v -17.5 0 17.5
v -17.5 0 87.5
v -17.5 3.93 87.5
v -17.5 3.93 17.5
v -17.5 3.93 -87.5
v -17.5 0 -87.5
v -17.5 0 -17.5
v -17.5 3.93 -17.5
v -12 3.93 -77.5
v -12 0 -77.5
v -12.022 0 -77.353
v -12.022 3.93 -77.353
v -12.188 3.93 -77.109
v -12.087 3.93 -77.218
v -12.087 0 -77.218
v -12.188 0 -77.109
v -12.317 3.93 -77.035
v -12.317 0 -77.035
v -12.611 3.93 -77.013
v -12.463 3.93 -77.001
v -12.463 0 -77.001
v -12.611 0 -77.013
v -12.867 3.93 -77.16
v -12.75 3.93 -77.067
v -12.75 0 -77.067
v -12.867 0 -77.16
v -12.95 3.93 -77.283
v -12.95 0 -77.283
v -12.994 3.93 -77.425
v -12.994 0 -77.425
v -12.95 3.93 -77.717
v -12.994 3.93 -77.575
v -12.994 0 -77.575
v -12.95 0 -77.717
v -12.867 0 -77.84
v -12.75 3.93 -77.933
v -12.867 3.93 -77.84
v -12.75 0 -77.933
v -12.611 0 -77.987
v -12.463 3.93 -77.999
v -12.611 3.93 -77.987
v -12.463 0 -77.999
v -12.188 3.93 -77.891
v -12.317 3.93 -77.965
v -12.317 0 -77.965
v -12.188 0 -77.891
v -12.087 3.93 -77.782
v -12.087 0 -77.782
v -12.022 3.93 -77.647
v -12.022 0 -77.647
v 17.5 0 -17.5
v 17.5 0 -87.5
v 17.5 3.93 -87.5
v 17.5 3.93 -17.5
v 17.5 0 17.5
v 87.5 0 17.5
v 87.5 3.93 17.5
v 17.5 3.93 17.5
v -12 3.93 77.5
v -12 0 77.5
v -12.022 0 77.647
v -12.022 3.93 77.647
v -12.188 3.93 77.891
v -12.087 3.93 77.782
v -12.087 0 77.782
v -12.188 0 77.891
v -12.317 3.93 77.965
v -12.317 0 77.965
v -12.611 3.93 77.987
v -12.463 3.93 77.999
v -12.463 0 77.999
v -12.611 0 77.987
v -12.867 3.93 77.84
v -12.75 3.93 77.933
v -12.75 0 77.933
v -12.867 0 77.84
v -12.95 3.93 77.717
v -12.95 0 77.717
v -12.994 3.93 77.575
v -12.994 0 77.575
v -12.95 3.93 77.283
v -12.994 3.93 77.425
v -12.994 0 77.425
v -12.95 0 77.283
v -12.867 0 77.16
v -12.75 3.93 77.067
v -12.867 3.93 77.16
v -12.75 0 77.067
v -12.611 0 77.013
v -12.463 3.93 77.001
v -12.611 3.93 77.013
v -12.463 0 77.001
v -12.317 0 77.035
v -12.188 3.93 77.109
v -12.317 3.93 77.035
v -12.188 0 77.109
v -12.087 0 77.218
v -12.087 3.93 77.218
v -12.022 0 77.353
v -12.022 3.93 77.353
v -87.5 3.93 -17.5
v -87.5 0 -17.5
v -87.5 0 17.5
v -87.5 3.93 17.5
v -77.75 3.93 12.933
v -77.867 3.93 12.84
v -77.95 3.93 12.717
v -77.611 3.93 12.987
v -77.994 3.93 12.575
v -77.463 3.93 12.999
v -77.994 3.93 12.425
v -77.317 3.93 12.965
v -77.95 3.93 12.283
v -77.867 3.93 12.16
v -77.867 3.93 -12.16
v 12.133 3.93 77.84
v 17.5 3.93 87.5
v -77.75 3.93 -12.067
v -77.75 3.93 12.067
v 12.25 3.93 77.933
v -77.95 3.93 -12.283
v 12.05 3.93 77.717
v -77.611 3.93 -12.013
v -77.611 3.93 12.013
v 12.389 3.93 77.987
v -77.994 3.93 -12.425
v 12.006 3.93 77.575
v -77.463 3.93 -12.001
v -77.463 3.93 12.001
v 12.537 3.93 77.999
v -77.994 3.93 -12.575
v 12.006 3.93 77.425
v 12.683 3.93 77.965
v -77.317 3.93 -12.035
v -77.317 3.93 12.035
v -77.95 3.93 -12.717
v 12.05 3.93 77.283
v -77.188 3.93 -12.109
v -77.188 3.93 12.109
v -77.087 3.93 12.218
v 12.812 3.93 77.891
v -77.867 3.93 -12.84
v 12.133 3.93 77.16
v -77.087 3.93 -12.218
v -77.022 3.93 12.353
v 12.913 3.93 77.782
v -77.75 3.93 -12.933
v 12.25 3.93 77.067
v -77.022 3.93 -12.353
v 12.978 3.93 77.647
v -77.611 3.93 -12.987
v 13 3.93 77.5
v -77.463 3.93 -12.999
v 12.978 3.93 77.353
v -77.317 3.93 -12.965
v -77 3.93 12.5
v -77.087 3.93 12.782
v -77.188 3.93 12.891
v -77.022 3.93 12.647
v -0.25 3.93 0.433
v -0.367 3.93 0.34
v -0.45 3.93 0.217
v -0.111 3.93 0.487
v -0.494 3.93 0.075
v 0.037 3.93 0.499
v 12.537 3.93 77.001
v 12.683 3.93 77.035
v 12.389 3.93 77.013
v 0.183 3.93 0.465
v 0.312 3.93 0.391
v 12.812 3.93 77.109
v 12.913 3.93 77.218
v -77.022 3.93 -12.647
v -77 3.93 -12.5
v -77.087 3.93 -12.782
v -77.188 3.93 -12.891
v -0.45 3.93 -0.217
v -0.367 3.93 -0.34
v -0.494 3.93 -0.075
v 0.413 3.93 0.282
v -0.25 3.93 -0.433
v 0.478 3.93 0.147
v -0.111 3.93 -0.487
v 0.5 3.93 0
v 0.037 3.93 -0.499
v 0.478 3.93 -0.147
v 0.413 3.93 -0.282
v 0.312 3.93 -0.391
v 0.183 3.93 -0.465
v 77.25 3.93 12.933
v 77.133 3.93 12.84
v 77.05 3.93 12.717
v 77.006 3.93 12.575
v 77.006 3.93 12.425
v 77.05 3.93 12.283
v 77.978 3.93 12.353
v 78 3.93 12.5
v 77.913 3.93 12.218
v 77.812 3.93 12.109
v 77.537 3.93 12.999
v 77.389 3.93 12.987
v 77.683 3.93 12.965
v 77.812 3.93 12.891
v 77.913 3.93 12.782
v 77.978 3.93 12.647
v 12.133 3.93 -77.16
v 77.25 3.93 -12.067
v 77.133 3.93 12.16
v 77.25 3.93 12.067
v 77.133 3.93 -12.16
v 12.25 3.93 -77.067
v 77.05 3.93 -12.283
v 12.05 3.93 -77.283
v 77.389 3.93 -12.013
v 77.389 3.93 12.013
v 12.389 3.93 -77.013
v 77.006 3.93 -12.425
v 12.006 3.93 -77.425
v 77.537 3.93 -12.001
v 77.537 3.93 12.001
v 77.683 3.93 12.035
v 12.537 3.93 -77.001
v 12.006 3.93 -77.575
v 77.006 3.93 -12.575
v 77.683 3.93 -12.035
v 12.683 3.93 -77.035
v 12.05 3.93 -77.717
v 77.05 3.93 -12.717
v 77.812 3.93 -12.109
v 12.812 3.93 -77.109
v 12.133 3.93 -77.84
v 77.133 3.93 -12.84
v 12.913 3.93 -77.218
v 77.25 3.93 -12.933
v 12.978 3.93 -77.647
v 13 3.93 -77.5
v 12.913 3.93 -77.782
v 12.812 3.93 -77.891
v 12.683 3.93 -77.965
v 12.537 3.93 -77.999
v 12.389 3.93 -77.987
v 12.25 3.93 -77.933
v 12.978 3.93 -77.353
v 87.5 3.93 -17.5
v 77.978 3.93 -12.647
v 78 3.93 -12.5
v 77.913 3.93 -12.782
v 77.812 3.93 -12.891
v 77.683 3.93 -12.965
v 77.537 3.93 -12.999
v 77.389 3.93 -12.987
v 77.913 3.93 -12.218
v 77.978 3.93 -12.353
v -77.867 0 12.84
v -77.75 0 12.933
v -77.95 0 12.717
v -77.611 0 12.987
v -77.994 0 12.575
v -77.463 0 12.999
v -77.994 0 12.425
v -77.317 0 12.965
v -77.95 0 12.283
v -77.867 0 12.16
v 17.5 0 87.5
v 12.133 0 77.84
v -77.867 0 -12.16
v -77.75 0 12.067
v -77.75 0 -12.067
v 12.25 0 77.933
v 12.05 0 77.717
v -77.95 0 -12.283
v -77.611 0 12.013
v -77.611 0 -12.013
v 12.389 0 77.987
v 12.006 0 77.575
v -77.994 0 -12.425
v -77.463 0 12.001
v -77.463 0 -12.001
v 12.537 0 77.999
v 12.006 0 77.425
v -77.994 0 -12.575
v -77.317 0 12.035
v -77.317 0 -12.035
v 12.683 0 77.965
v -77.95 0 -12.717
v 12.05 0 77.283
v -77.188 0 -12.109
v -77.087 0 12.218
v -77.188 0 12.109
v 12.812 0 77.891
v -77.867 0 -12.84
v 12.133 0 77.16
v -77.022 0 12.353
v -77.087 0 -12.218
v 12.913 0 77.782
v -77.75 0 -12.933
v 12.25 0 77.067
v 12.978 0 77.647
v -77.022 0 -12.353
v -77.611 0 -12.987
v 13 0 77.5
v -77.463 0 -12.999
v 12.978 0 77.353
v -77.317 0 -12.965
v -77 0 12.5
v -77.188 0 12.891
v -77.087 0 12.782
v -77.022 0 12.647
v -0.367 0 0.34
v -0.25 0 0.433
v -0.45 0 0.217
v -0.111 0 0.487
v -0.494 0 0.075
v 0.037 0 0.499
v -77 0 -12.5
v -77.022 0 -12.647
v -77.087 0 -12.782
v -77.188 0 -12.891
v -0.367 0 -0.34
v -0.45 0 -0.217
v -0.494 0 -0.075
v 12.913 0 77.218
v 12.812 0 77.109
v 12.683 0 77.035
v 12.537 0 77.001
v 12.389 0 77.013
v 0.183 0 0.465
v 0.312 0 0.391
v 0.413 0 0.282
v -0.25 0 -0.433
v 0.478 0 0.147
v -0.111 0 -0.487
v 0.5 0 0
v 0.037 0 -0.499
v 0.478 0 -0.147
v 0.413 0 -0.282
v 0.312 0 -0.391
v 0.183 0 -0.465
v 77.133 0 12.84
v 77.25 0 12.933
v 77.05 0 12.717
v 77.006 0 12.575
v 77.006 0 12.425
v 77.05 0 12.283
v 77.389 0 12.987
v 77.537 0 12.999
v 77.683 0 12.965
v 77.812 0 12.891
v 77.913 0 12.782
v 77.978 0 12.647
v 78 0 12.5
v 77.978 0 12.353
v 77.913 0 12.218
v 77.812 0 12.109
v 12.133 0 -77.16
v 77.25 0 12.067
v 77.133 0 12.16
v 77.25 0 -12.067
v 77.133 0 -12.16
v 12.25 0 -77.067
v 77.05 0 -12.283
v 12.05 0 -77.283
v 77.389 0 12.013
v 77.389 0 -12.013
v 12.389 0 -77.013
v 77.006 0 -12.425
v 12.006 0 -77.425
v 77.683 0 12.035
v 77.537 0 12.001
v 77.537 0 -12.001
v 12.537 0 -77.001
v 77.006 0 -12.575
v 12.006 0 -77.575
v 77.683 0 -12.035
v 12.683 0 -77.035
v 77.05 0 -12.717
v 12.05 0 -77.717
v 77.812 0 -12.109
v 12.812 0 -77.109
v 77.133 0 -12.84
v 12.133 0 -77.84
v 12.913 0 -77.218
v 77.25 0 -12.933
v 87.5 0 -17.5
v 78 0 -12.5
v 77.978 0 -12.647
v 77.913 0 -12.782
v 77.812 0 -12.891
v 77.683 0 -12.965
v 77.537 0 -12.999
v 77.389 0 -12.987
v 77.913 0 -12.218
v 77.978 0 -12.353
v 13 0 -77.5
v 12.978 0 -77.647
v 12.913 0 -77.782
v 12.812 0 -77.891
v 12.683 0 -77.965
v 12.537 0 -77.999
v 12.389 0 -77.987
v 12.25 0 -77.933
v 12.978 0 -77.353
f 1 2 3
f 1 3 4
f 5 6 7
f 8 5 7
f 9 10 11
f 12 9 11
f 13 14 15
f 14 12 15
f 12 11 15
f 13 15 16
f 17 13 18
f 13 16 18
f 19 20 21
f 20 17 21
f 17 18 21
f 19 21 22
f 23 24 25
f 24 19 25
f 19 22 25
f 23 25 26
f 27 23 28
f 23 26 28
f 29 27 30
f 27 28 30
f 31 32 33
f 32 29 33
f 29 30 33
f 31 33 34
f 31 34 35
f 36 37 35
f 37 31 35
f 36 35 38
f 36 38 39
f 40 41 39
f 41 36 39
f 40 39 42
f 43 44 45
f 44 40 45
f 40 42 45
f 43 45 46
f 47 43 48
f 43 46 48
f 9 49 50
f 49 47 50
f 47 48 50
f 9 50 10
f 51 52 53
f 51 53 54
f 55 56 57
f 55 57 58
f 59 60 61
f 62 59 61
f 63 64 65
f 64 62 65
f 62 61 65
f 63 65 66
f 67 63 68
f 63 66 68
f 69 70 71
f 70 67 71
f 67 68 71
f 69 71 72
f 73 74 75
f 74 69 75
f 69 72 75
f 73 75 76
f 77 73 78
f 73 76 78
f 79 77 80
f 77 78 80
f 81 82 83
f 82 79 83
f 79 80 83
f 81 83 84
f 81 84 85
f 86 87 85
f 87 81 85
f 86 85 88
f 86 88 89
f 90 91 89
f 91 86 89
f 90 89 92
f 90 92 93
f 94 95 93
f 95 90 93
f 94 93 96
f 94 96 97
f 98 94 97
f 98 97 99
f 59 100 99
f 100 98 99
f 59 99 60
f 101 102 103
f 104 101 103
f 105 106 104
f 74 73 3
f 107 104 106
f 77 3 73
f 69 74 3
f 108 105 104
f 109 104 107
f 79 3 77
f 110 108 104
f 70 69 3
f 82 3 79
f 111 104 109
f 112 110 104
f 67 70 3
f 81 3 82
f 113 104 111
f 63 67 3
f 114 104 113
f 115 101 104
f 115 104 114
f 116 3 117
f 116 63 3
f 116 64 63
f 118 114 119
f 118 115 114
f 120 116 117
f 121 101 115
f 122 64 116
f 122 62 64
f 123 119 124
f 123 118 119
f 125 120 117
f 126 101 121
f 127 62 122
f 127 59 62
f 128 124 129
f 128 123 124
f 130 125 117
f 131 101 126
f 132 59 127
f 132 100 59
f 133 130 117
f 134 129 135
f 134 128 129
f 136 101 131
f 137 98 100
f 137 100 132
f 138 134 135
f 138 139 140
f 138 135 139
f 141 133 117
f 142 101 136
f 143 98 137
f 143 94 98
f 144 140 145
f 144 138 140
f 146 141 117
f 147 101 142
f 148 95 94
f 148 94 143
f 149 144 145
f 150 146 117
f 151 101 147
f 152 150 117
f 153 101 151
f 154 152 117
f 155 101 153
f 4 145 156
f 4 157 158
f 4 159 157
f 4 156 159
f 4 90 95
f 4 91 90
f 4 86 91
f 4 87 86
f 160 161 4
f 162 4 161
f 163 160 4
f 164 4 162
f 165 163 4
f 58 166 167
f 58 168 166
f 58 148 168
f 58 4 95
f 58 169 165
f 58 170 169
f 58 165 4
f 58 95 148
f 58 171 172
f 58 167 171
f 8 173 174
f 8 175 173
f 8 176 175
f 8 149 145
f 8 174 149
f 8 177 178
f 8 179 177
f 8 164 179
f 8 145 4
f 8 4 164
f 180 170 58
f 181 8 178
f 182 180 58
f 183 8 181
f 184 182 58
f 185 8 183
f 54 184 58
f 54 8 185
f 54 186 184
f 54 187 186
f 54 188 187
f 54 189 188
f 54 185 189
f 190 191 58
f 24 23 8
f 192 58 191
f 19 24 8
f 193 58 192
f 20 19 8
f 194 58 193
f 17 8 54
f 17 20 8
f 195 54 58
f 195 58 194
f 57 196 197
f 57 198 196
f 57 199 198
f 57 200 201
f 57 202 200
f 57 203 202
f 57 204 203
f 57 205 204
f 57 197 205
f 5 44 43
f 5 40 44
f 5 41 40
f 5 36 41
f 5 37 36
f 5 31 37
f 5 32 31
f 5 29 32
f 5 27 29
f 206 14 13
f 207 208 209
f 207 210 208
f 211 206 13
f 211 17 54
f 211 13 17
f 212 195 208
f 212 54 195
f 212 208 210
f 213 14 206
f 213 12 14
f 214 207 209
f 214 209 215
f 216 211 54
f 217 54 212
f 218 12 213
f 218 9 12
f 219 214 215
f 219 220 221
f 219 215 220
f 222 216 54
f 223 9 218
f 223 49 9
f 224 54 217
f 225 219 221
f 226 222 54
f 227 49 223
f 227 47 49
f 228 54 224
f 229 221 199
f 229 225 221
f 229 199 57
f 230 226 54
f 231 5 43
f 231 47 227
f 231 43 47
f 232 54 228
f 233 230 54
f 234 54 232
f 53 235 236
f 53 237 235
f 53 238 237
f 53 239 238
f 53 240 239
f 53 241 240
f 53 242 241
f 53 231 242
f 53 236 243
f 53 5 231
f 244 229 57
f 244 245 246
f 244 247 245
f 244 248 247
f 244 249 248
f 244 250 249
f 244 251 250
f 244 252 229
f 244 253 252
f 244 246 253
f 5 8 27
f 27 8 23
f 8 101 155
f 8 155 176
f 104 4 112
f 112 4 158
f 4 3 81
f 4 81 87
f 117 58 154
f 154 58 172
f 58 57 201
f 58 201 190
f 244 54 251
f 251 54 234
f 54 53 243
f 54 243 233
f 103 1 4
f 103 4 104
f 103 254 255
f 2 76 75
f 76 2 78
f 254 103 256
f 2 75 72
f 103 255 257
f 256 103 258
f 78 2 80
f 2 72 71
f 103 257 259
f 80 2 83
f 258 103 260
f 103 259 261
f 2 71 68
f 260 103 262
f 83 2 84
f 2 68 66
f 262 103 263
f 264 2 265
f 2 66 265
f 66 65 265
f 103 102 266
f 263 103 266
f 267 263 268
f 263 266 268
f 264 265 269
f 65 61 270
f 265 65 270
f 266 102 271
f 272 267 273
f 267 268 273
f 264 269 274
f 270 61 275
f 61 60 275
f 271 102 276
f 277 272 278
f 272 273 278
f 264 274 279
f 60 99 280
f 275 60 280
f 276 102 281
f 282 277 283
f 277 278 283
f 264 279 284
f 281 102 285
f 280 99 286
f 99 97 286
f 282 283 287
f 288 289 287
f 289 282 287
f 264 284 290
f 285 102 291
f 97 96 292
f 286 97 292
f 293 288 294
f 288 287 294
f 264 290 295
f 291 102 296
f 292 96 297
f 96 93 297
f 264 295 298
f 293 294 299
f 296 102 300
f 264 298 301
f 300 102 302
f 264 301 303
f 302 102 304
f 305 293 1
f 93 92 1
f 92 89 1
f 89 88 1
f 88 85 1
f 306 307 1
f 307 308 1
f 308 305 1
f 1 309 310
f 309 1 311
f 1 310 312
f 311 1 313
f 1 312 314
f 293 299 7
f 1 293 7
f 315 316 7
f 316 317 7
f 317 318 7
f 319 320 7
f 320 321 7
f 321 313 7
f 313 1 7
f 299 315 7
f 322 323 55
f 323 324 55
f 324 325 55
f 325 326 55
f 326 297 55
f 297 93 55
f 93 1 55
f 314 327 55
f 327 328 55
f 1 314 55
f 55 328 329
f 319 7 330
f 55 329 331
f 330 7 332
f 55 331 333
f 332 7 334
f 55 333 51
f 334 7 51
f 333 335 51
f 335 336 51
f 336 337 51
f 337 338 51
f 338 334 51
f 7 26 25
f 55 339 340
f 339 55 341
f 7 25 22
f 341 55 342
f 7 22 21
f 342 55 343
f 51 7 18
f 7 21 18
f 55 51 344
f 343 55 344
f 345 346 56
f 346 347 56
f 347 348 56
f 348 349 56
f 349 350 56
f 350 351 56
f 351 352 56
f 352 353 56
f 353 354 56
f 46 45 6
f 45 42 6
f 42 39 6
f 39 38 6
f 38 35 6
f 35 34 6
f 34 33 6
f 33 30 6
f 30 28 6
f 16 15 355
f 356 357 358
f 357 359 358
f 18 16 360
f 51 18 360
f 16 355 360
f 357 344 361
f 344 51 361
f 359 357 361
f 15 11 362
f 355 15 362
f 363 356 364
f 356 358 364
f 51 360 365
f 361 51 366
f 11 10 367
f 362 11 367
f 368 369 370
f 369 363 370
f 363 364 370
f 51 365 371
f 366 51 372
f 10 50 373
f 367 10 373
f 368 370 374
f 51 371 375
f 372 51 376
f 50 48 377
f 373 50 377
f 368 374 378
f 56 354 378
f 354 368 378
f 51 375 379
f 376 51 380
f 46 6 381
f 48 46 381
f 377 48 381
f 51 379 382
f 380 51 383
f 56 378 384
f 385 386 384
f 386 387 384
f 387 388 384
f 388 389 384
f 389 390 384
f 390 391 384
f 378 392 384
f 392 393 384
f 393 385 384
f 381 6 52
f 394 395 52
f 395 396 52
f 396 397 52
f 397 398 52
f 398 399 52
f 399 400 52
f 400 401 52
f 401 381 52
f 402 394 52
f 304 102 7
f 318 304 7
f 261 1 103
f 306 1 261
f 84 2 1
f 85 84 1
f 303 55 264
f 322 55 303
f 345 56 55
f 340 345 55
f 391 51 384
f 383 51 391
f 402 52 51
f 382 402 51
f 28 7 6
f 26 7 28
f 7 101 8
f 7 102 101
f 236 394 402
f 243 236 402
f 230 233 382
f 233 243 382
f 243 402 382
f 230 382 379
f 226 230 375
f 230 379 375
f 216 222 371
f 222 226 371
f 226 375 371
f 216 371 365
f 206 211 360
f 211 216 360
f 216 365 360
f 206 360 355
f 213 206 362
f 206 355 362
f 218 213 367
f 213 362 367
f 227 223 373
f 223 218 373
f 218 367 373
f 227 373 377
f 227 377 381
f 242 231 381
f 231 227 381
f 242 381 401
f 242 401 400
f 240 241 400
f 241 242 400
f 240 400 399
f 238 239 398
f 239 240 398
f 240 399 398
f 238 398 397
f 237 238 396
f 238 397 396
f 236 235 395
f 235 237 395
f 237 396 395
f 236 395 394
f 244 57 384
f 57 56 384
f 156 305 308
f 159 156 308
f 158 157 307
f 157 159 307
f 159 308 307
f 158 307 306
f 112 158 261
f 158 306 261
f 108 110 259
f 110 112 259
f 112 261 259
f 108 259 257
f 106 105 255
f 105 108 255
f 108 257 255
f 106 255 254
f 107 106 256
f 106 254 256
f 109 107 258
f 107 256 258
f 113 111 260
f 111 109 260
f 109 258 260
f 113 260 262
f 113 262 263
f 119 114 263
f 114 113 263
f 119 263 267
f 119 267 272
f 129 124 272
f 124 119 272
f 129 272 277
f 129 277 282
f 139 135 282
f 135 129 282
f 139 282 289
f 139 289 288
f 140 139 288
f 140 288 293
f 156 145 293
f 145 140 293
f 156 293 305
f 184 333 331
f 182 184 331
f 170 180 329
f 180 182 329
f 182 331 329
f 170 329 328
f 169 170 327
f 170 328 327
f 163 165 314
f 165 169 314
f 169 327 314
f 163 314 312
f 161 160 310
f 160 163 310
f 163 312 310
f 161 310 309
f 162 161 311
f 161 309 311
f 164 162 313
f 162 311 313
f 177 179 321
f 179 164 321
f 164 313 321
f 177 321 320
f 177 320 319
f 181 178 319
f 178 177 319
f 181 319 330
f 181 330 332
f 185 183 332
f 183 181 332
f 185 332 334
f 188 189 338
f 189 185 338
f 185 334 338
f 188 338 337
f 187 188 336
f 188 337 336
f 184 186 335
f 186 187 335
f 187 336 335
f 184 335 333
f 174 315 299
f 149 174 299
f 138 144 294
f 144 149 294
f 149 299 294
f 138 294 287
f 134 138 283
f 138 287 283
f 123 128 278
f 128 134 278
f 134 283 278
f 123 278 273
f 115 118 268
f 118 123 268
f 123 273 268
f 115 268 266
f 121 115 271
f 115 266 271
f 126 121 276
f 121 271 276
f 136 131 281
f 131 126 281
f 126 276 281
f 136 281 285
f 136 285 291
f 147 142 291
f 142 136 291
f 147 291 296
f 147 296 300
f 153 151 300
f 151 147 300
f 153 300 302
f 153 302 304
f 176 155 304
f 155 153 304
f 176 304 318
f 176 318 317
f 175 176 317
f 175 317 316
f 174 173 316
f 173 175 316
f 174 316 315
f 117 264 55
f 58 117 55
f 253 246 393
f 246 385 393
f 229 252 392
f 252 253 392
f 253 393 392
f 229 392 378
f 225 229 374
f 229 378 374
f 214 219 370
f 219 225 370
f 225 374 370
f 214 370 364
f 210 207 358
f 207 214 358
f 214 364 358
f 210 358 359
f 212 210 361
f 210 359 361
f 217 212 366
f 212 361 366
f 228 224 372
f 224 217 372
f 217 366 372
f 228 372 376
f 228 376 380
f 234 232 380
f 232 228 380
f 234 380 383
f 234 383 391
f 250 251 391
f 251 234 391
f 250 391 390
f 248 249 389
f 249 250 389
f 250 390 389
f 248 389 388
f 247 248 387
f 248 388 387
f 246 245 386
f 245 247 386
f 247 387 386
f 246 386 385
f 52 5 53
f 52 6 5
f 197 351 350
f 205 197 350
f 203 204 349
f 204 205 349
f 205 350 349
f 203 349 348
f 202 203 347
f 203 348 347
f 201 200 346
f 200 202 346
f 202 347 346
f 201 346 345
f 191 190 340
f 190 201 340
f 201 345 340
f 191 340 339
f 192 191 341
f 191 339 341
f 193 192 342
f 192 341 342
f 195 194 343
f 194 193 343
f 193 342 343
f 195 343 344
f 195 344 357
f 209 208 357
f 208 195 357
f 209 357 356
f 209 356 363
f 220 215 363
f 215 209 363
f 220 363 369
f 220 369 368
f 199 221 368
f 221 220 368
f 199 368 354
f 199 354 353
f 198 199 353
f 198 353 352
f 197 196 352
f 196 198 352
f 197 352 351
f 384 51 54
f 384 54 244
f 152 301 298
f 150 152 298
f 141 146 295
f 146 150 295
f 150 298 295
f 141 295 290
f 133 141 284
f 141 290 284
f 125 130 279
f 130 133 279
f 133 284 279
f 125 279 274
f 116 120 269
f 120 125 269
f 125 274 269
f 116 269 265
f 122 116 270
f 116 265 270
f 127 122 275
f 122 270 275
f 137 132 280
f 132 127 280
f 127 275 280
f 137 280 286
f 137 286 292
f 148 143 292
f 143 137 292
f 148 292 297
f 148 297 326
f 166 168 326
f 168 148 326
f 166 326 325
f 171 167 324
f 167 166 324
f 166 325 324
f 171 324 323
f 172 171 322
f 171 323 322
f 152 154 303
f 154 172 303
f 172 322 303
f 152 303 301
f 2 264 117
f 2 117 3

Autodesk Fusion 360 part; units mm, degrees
sketch "Sketch1" plane through (0, 0, 0) normal (0, 1, 0) x (1, 0, 0)
  line L0 (17.5, -87.5) -> (-17.5, -87.5)
  line L1 (-17.5, 87.5) -> (17.5, 87.5)
  line L2 (17.5, -87.5) -> (-17.5, 87.5) construction
  line L3 (-17.5, -87.5) -> (17.5, 87.5) construction
  line L4 (-87.5, 17.5) -> (-87.5, -17.5)
  line L5 (87.5, -17.5) -> (87.5, 17.5)
  line L6 (87.5, 17.5) -> (-87.5, -17.5) construction
  line L7 (-87.5, 17.5) -> (87.5, -17.5) construction
  circle A0 centre (-77.5, 12.5) radius 0.5
  circle A1 centre (-77.5, -12.5) radius 0.5
  circle A2 centre (-12.5, -77.5) radius 0.5
  circle A3 centre (12.5, -77.5) radius 0.5
  circle A4 centre (77.5, -12.5) radius 0.5
  circle A5 centre (77.5, 12.5) radius 0.5
  circle A6 centre (-12.5, 77.5) radius 0.5
  circle A7 centre (12.5, 77.5) radius 0.5
  line L8 (-17.5, 87.5) -> (-17.5, 17.5)
  line L9 (17.5, 87.5) -> (17.5, 17.5)
  line L10 (-17.5, -87.5) -> (-17.5, -17.5)
  line L11 (17.5, -87.5) -> (17.5, -17.5)
  line L12 (-87.5, 17.5) -> (-17.5, 17.5)
  line L13 (17.5, 17.5) -> (87.5, 17.5)
  line L14 (87.5, -17.5) -> (17.5, -17.5)
  line L15 (-17.5, -17.5) -> (-87.5, -17.5)
  circle A8 centre (0, 0) radius 0.5
  dimension "d1" = 35
  dimension "d2" = 175
  dimension "d3" = 175
  dimension "d4" = 35
  dimension "d7" = 1
  dimension "d8" = 10
  dimension "d10" = 1
  dimension "d12" = 10
  dimension "d13" = 1
  dimension "d14" = 1
  dimension "d15" = 1
  dimension "d16" = 1
  dimension "d17" = 1
  dimension "d18" = 1
  dimension "d20" = 10
  dimension "d21" = 10
  dimension "d24" = 10
  dimension "d25" = 10
  dimension "d28" = 10
  dimension "d29" = 10
  dimension "d31" = 5
  dimension "d32" = 5
  dimension "d33" = 5
  dimension "d34" = 5
  dimension "d35" = 5
  dimension "d36" = 5
  dimension "d37" = 5
  dimension "d38" = 5
  dimension "d39" = 1
  dimension "d40" = 70
  dimension "d41" = 70
extrude "Extrude1" add sketch "Sketch1" along normal blind 3.93
